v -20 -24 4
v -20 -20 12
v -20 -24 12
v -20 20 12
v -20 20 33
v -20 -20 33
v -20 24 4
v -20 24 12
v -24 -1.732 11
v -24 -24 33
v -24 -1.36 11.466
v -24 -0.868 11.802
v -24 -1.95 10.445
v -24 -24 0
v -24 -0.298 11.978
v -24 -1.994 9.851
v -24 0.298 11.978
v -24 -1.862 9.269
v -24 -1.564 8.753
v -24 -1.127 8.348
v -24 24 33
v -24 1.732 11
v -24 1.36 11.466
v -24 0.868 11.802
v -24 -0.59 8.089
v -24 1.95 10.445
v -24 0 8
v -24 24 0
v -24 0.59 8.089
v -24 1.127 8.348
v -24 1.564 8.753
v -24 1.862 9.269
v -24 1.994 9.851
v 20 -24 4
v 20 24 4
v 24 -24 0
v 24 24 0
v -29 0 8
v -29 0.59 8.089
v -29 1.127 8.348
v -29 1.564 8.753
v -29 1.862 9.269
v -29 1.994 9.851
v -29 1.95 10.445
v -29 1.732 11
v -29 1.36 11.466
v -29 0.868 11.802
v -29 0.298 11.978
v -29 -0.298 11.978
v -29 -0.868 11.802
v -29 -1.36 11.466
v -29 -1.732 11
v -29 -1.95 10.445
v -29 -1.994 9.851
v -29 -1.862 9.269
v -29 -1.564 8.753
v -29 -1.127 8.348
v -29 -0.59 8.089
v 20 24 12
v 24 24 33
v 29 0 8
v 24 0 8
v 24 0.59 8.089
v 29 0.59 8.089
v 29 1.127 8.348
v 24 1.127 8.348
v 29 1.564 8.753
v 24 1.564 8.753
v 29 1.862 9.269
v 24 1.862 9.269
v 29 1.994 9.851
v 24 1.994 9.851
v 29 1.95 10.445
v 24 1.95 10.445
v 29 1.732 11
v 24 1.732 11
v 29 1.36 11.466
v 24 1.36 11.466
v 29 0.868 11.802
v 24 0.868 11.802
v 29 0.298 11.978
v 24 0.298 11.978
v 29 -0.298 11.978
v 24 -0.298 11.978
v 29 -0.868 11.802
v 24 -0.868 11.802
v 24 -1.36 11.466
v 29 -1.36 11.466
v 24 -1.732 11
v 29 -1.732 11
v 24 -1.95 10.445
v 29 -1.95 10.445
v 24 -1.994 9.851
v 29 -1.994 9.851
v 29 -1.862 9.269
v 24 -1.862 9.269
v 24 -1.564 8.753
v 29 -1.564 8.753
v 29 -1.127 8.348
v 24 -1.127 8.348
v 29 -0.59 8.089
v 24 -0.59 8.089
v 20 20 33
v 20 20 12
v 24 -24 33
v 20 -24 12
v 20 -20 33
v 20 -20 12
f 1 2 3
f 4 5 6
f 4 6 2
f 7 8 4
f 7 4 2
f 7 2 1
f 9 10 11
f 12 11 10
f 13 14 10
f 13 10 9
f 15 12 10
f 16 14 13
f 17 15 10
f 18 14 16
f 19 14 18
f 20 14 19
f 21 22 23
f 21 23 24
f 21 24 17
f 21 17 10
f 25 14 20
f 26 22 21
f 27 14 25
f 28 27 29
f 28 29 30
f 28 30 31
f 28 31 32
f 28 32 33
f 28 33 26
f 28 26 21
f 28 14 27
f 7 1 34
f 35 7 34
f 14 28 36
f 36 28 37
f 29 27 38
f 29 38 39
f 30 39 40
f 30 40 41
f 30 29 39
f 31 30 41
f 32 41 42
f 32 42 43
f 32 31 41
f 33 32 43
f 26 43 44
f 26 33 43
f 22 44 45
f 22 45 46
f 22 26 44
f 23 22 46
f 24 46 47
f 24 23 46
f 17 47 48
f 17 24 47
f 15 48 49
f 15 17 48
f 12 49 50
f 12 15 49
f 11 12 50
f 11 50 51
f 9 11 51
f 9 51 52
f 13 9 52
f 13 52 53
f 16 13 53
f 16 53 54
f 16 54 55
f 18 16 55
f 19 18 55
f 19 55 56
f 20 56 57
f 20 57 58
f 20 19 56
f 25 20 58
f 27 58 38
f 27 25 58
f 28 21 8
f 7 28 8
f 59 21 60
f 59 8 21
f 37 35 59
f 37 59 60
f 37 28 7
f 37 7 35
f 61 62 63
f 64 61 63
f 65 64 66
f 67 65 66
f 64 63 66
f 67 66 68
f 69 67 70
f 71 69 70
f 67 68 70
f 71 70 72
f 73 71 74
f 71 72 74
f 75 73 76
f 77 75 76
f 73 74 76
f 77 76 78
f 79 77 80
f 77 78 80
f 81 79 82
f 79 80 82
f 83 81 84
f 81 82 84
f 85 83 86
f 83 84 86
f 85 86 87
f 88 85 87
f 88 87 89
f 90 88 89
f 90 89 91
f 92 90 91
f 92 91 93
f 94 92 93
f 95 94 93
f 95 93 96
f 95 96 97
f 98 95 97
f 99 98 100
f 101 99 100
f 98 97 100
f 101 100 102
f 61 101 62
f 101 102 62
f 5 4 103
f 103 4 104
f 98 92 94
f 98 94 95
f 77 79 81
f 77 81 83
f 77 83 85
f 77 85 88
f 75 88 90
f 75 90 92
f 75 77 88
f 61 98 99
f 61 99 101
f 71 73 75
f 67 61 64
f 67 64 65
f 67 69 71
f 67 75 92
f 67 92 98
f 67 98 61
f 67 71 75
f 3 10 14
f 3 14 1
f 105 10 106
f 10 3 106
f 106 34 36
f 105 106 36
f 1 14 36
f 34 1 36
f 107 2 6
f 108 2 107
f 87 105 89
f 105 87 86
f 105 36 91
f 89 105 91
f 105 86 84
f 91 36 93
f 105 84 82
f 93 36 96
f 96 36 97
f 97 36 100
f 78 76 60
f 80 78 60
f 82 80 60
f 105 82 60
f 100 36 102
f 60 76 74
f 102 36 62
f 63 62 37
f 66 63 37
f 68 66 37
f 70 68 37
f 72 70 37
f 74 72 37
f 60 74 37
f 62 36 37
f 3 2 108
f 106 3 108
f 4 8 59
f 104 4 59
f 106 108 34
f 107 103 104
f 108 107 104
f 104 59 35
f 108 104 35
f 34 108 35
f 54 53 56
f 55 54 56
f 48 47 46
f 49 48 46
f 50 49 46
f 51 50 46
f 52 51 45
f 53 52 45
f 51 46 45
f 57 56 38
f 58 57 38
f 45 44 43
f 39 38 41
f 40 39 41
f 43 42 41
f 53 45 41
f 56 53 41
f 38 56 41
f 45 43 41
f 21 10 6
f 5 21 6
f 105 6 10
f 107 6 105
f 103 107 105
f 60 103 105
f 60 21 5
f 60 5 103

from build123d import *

# Parameters (mm, degrees)
SKETCH1_W           = 48
SKETCH1_H           = 48
BOSS_EXTRUDE1_DEPTH = 33
SHELL1_T            = -4
SKETCH2_W           = 40
SKETCH2_H           = 8
CUT_EXTRUDE1_DEPTH  = 49
SKETCH3_R           = 2
BOSS_EXTRUDE2_DEPTH = 5


with BuildPart() as part:
    # Sketch1 → Boss-Extrude1 (new body)
    with BuildSketch(Plane.XY):
        Rectangle(SKETCH1_W, SKETCH1_H)
    extrude(amount=BOSS_EXTRUDE1_DEPTH)

    # Shell1
    shell1_openings = [part.faces().sort_by_distance(p)[0] for p in [
        (0, 0, 33),
    ]]
    offset(amount=SHELL1_T, openings=shell1_openings, kind=Kind.INTERSECTION)

    # Sketch2 → Cut-Extrude1 (cut, through all)
    with BuildSketch(Plane(origin=(0, 24, 0), x_dir=(1, 0, 0), z_dir=(0, 1, 0))):
        with Locations((0, -8)):
            Rectangle(SKETCH2_W, SKETCH2_H)
    extrude(amount=-CUT_EXTRUDE1_DEPTH, mode=Mode.SUBTRACT)

    # Sketch3 → Boss-Extrude2 (add)
    with BuildSketch(Plane(origin=(24, 0, 0), x_dir=(0, 0, -1), z_dir=(1, 0, 0))):
        with Locations((-10, 0)):
            Circle(SKETCH3_R)
    boss_extrude2 = extrude(amount=BOSS_EXTRUDE2_DEPTH)

    # Mirror1: Boss-Extrude2 across plane
    add(boss_extrude2.mirror(Plane(origin=(0, 0, 0), x_dir=(0, 0, 1), z_dir=(1, 0, 0))))


solid = part.part
